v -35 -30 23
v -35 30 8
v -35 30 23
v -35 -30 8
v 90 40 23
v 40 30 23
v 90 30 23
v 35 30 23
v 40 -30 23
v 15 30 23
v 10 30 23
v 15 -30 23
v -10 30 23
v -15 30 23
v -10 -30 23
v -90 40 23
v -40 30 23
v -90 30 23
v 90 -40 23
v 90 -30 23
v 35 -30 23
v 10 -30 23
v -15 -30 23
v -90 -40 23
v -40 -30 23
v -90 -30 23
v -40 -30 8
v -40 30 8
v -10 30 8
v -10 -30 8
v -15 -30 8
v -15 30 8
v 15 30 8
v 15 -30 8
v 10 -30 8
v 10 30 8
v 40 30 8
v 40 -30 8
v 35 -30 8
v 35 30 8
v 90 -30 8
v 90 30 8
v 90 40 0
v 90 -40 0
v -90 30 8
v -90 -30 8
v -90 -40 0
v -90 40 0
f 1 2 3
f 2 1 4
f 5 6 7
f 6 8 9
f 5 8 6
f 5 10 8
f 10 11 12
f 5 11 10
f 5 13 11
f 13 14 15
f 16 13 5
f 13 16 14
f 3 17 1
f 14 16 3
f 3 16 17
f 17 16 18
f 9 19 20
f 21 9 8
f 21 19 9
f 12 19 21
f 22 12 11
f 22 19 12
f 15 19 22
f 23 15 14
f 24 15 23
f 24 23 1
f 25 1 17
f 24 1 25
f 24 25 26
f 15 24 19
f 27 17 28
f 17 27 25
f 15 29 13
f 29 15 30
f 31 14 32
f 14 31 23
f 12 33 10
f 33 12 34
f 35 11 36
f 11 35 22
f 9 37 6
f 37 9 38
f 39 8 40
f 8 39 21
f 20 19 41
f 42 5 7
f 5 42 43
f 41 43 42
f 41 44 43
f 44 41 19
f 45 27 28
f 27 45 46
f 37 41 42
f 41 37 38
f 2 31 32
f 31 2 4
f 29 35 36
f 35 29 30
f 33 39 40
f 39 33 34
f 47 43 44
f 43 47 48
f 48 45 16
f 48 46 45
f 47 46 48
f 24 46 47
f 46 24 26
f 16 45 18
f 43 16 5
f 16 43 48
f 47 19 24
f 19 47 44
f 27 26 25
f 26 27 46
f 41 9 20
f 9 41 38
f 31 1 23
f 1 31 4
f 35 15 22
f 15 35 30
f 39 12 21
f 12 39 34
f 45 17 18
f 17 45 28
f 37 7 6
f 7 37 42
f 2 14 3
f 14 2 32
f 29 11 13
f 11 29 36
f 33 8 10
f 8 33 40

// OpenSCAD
$fn = 32;

// ----------------------------------------------------------------------
// Rib frame 180 x 80 x 23
// 4 ribs at 25 mm pitch
// ----------------------------------------------------------------------

// --- parameters (mm) ---
frame = [180, 80, 8];  // base plate size (x, y, z)
rail_w = 10;           // side rail width
ribs = 4;              // number of ribs
rib_t = 5;             // rib thickness
rib_h = 15;            // rib height above the base plate
pitch = 25;            // pitch between rib centres

// --- derived feature positions (mm) ---
span = (ribs - 1) * pitch;          // = 75   distance between the outer ribs
origin_x = -span / 2;               // = -37.5   X of the first rib
rib_len = frame[1] - 2 * rail_w + 2;  // = 62   rib length, 1 mm into each rail
feature_centers = [
  [origin_x + 0 * pitch, 0],
  [origin_x + 1 * pitch, 0],
  [origin_x + 2 * pitch, 0],
  [origin_x + 3 * pitch, 0]
];   // rib centre line, drives the rib loop

// base plate, two side rails, then the ribs read straight off feature_centers
union() {
  translate([-frame[0] / 2, -frame[1] / 2, 0]) cube(frame);
  translate([-frame[0] / 2, -frame[1] / 2, 0]) cube([frame[0], rail_w, frame[2] + rib_h]);
  translate([-frame[0] / 2, frame[1] / 2 - rail_w, 0]) cube([frame[0], rail_w, frame[2] + rib_h]);
  for (centre = feature_centers)
    translate([centre[0] - rib_t / 2, centre[1] - rib_len / 2, frame[2] - 1])
      cube([rib_t, rib_len, rib_h + 1]);
}
